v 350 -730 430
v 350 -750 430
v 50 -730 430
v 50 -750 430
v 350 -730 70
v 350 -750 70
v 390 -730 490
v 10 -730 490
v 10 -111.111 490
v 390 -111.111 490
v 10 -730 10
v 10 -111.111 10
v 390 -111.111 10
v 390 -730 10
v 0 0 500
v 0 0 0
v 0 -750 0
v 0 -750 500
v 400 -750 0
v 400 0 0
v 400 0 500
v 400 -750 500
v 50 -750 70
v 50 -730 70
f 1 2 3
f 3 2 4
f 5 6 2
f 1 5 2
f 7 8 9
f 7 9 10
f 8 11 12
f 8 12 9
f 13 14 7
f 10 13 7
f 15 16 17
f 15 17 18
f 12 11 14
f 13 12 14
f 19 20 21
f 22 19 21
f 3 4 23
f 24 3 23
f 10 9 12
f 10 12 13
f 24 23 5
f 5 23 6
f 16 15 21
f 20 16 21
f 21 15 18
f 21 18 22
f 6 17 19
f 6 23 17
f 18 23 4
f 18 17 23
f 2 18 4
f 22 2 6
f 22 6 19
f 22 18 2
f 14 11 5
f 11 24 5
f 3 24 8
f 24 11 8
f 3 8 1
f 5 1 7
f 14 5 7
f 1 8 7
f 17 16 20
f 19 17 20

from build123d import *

# Parameters (mm, degrees)
F0_W     = 400
F0_H     = 500
F1_DEPTH = 750
F3_DEPTH = 20
F4_W     = 380
F4_H     = 480
F5_DEPTH = 618.889272


with BuildPart() as f1:
    # F0 (on Front) → F1 (new body)
    with BuildSketch(Plane.XZ):
        with Locations((200, 250)):
            Rectangle(F0_W, F0_H)
    extrude(amount=F1_DEPTH)

    # F2 (on face) → F3 (cut)
    with BuildSketch(Plane.XZ.offset(750)):
        Polygon((50, 70), (56, 70), (344, 430), (50, 430), align=None)
        Polygon((344, 430), (56, 70), (350, 70), (350, 430), align=None)
    extrude(amount=-F3_DEPTH, mode=Mode.SUBTRACT)

    # F4 (on face) → F5 (cut)
    with BuildSketch(Plane.XZ.offset(730)):
        with Locations((200, 250)):
            Rectangle(F4_W, F4_H)
    extrude(amount=-F5_DEPTH, mode=Mode.SUBTRACT)


solid = f1.part
